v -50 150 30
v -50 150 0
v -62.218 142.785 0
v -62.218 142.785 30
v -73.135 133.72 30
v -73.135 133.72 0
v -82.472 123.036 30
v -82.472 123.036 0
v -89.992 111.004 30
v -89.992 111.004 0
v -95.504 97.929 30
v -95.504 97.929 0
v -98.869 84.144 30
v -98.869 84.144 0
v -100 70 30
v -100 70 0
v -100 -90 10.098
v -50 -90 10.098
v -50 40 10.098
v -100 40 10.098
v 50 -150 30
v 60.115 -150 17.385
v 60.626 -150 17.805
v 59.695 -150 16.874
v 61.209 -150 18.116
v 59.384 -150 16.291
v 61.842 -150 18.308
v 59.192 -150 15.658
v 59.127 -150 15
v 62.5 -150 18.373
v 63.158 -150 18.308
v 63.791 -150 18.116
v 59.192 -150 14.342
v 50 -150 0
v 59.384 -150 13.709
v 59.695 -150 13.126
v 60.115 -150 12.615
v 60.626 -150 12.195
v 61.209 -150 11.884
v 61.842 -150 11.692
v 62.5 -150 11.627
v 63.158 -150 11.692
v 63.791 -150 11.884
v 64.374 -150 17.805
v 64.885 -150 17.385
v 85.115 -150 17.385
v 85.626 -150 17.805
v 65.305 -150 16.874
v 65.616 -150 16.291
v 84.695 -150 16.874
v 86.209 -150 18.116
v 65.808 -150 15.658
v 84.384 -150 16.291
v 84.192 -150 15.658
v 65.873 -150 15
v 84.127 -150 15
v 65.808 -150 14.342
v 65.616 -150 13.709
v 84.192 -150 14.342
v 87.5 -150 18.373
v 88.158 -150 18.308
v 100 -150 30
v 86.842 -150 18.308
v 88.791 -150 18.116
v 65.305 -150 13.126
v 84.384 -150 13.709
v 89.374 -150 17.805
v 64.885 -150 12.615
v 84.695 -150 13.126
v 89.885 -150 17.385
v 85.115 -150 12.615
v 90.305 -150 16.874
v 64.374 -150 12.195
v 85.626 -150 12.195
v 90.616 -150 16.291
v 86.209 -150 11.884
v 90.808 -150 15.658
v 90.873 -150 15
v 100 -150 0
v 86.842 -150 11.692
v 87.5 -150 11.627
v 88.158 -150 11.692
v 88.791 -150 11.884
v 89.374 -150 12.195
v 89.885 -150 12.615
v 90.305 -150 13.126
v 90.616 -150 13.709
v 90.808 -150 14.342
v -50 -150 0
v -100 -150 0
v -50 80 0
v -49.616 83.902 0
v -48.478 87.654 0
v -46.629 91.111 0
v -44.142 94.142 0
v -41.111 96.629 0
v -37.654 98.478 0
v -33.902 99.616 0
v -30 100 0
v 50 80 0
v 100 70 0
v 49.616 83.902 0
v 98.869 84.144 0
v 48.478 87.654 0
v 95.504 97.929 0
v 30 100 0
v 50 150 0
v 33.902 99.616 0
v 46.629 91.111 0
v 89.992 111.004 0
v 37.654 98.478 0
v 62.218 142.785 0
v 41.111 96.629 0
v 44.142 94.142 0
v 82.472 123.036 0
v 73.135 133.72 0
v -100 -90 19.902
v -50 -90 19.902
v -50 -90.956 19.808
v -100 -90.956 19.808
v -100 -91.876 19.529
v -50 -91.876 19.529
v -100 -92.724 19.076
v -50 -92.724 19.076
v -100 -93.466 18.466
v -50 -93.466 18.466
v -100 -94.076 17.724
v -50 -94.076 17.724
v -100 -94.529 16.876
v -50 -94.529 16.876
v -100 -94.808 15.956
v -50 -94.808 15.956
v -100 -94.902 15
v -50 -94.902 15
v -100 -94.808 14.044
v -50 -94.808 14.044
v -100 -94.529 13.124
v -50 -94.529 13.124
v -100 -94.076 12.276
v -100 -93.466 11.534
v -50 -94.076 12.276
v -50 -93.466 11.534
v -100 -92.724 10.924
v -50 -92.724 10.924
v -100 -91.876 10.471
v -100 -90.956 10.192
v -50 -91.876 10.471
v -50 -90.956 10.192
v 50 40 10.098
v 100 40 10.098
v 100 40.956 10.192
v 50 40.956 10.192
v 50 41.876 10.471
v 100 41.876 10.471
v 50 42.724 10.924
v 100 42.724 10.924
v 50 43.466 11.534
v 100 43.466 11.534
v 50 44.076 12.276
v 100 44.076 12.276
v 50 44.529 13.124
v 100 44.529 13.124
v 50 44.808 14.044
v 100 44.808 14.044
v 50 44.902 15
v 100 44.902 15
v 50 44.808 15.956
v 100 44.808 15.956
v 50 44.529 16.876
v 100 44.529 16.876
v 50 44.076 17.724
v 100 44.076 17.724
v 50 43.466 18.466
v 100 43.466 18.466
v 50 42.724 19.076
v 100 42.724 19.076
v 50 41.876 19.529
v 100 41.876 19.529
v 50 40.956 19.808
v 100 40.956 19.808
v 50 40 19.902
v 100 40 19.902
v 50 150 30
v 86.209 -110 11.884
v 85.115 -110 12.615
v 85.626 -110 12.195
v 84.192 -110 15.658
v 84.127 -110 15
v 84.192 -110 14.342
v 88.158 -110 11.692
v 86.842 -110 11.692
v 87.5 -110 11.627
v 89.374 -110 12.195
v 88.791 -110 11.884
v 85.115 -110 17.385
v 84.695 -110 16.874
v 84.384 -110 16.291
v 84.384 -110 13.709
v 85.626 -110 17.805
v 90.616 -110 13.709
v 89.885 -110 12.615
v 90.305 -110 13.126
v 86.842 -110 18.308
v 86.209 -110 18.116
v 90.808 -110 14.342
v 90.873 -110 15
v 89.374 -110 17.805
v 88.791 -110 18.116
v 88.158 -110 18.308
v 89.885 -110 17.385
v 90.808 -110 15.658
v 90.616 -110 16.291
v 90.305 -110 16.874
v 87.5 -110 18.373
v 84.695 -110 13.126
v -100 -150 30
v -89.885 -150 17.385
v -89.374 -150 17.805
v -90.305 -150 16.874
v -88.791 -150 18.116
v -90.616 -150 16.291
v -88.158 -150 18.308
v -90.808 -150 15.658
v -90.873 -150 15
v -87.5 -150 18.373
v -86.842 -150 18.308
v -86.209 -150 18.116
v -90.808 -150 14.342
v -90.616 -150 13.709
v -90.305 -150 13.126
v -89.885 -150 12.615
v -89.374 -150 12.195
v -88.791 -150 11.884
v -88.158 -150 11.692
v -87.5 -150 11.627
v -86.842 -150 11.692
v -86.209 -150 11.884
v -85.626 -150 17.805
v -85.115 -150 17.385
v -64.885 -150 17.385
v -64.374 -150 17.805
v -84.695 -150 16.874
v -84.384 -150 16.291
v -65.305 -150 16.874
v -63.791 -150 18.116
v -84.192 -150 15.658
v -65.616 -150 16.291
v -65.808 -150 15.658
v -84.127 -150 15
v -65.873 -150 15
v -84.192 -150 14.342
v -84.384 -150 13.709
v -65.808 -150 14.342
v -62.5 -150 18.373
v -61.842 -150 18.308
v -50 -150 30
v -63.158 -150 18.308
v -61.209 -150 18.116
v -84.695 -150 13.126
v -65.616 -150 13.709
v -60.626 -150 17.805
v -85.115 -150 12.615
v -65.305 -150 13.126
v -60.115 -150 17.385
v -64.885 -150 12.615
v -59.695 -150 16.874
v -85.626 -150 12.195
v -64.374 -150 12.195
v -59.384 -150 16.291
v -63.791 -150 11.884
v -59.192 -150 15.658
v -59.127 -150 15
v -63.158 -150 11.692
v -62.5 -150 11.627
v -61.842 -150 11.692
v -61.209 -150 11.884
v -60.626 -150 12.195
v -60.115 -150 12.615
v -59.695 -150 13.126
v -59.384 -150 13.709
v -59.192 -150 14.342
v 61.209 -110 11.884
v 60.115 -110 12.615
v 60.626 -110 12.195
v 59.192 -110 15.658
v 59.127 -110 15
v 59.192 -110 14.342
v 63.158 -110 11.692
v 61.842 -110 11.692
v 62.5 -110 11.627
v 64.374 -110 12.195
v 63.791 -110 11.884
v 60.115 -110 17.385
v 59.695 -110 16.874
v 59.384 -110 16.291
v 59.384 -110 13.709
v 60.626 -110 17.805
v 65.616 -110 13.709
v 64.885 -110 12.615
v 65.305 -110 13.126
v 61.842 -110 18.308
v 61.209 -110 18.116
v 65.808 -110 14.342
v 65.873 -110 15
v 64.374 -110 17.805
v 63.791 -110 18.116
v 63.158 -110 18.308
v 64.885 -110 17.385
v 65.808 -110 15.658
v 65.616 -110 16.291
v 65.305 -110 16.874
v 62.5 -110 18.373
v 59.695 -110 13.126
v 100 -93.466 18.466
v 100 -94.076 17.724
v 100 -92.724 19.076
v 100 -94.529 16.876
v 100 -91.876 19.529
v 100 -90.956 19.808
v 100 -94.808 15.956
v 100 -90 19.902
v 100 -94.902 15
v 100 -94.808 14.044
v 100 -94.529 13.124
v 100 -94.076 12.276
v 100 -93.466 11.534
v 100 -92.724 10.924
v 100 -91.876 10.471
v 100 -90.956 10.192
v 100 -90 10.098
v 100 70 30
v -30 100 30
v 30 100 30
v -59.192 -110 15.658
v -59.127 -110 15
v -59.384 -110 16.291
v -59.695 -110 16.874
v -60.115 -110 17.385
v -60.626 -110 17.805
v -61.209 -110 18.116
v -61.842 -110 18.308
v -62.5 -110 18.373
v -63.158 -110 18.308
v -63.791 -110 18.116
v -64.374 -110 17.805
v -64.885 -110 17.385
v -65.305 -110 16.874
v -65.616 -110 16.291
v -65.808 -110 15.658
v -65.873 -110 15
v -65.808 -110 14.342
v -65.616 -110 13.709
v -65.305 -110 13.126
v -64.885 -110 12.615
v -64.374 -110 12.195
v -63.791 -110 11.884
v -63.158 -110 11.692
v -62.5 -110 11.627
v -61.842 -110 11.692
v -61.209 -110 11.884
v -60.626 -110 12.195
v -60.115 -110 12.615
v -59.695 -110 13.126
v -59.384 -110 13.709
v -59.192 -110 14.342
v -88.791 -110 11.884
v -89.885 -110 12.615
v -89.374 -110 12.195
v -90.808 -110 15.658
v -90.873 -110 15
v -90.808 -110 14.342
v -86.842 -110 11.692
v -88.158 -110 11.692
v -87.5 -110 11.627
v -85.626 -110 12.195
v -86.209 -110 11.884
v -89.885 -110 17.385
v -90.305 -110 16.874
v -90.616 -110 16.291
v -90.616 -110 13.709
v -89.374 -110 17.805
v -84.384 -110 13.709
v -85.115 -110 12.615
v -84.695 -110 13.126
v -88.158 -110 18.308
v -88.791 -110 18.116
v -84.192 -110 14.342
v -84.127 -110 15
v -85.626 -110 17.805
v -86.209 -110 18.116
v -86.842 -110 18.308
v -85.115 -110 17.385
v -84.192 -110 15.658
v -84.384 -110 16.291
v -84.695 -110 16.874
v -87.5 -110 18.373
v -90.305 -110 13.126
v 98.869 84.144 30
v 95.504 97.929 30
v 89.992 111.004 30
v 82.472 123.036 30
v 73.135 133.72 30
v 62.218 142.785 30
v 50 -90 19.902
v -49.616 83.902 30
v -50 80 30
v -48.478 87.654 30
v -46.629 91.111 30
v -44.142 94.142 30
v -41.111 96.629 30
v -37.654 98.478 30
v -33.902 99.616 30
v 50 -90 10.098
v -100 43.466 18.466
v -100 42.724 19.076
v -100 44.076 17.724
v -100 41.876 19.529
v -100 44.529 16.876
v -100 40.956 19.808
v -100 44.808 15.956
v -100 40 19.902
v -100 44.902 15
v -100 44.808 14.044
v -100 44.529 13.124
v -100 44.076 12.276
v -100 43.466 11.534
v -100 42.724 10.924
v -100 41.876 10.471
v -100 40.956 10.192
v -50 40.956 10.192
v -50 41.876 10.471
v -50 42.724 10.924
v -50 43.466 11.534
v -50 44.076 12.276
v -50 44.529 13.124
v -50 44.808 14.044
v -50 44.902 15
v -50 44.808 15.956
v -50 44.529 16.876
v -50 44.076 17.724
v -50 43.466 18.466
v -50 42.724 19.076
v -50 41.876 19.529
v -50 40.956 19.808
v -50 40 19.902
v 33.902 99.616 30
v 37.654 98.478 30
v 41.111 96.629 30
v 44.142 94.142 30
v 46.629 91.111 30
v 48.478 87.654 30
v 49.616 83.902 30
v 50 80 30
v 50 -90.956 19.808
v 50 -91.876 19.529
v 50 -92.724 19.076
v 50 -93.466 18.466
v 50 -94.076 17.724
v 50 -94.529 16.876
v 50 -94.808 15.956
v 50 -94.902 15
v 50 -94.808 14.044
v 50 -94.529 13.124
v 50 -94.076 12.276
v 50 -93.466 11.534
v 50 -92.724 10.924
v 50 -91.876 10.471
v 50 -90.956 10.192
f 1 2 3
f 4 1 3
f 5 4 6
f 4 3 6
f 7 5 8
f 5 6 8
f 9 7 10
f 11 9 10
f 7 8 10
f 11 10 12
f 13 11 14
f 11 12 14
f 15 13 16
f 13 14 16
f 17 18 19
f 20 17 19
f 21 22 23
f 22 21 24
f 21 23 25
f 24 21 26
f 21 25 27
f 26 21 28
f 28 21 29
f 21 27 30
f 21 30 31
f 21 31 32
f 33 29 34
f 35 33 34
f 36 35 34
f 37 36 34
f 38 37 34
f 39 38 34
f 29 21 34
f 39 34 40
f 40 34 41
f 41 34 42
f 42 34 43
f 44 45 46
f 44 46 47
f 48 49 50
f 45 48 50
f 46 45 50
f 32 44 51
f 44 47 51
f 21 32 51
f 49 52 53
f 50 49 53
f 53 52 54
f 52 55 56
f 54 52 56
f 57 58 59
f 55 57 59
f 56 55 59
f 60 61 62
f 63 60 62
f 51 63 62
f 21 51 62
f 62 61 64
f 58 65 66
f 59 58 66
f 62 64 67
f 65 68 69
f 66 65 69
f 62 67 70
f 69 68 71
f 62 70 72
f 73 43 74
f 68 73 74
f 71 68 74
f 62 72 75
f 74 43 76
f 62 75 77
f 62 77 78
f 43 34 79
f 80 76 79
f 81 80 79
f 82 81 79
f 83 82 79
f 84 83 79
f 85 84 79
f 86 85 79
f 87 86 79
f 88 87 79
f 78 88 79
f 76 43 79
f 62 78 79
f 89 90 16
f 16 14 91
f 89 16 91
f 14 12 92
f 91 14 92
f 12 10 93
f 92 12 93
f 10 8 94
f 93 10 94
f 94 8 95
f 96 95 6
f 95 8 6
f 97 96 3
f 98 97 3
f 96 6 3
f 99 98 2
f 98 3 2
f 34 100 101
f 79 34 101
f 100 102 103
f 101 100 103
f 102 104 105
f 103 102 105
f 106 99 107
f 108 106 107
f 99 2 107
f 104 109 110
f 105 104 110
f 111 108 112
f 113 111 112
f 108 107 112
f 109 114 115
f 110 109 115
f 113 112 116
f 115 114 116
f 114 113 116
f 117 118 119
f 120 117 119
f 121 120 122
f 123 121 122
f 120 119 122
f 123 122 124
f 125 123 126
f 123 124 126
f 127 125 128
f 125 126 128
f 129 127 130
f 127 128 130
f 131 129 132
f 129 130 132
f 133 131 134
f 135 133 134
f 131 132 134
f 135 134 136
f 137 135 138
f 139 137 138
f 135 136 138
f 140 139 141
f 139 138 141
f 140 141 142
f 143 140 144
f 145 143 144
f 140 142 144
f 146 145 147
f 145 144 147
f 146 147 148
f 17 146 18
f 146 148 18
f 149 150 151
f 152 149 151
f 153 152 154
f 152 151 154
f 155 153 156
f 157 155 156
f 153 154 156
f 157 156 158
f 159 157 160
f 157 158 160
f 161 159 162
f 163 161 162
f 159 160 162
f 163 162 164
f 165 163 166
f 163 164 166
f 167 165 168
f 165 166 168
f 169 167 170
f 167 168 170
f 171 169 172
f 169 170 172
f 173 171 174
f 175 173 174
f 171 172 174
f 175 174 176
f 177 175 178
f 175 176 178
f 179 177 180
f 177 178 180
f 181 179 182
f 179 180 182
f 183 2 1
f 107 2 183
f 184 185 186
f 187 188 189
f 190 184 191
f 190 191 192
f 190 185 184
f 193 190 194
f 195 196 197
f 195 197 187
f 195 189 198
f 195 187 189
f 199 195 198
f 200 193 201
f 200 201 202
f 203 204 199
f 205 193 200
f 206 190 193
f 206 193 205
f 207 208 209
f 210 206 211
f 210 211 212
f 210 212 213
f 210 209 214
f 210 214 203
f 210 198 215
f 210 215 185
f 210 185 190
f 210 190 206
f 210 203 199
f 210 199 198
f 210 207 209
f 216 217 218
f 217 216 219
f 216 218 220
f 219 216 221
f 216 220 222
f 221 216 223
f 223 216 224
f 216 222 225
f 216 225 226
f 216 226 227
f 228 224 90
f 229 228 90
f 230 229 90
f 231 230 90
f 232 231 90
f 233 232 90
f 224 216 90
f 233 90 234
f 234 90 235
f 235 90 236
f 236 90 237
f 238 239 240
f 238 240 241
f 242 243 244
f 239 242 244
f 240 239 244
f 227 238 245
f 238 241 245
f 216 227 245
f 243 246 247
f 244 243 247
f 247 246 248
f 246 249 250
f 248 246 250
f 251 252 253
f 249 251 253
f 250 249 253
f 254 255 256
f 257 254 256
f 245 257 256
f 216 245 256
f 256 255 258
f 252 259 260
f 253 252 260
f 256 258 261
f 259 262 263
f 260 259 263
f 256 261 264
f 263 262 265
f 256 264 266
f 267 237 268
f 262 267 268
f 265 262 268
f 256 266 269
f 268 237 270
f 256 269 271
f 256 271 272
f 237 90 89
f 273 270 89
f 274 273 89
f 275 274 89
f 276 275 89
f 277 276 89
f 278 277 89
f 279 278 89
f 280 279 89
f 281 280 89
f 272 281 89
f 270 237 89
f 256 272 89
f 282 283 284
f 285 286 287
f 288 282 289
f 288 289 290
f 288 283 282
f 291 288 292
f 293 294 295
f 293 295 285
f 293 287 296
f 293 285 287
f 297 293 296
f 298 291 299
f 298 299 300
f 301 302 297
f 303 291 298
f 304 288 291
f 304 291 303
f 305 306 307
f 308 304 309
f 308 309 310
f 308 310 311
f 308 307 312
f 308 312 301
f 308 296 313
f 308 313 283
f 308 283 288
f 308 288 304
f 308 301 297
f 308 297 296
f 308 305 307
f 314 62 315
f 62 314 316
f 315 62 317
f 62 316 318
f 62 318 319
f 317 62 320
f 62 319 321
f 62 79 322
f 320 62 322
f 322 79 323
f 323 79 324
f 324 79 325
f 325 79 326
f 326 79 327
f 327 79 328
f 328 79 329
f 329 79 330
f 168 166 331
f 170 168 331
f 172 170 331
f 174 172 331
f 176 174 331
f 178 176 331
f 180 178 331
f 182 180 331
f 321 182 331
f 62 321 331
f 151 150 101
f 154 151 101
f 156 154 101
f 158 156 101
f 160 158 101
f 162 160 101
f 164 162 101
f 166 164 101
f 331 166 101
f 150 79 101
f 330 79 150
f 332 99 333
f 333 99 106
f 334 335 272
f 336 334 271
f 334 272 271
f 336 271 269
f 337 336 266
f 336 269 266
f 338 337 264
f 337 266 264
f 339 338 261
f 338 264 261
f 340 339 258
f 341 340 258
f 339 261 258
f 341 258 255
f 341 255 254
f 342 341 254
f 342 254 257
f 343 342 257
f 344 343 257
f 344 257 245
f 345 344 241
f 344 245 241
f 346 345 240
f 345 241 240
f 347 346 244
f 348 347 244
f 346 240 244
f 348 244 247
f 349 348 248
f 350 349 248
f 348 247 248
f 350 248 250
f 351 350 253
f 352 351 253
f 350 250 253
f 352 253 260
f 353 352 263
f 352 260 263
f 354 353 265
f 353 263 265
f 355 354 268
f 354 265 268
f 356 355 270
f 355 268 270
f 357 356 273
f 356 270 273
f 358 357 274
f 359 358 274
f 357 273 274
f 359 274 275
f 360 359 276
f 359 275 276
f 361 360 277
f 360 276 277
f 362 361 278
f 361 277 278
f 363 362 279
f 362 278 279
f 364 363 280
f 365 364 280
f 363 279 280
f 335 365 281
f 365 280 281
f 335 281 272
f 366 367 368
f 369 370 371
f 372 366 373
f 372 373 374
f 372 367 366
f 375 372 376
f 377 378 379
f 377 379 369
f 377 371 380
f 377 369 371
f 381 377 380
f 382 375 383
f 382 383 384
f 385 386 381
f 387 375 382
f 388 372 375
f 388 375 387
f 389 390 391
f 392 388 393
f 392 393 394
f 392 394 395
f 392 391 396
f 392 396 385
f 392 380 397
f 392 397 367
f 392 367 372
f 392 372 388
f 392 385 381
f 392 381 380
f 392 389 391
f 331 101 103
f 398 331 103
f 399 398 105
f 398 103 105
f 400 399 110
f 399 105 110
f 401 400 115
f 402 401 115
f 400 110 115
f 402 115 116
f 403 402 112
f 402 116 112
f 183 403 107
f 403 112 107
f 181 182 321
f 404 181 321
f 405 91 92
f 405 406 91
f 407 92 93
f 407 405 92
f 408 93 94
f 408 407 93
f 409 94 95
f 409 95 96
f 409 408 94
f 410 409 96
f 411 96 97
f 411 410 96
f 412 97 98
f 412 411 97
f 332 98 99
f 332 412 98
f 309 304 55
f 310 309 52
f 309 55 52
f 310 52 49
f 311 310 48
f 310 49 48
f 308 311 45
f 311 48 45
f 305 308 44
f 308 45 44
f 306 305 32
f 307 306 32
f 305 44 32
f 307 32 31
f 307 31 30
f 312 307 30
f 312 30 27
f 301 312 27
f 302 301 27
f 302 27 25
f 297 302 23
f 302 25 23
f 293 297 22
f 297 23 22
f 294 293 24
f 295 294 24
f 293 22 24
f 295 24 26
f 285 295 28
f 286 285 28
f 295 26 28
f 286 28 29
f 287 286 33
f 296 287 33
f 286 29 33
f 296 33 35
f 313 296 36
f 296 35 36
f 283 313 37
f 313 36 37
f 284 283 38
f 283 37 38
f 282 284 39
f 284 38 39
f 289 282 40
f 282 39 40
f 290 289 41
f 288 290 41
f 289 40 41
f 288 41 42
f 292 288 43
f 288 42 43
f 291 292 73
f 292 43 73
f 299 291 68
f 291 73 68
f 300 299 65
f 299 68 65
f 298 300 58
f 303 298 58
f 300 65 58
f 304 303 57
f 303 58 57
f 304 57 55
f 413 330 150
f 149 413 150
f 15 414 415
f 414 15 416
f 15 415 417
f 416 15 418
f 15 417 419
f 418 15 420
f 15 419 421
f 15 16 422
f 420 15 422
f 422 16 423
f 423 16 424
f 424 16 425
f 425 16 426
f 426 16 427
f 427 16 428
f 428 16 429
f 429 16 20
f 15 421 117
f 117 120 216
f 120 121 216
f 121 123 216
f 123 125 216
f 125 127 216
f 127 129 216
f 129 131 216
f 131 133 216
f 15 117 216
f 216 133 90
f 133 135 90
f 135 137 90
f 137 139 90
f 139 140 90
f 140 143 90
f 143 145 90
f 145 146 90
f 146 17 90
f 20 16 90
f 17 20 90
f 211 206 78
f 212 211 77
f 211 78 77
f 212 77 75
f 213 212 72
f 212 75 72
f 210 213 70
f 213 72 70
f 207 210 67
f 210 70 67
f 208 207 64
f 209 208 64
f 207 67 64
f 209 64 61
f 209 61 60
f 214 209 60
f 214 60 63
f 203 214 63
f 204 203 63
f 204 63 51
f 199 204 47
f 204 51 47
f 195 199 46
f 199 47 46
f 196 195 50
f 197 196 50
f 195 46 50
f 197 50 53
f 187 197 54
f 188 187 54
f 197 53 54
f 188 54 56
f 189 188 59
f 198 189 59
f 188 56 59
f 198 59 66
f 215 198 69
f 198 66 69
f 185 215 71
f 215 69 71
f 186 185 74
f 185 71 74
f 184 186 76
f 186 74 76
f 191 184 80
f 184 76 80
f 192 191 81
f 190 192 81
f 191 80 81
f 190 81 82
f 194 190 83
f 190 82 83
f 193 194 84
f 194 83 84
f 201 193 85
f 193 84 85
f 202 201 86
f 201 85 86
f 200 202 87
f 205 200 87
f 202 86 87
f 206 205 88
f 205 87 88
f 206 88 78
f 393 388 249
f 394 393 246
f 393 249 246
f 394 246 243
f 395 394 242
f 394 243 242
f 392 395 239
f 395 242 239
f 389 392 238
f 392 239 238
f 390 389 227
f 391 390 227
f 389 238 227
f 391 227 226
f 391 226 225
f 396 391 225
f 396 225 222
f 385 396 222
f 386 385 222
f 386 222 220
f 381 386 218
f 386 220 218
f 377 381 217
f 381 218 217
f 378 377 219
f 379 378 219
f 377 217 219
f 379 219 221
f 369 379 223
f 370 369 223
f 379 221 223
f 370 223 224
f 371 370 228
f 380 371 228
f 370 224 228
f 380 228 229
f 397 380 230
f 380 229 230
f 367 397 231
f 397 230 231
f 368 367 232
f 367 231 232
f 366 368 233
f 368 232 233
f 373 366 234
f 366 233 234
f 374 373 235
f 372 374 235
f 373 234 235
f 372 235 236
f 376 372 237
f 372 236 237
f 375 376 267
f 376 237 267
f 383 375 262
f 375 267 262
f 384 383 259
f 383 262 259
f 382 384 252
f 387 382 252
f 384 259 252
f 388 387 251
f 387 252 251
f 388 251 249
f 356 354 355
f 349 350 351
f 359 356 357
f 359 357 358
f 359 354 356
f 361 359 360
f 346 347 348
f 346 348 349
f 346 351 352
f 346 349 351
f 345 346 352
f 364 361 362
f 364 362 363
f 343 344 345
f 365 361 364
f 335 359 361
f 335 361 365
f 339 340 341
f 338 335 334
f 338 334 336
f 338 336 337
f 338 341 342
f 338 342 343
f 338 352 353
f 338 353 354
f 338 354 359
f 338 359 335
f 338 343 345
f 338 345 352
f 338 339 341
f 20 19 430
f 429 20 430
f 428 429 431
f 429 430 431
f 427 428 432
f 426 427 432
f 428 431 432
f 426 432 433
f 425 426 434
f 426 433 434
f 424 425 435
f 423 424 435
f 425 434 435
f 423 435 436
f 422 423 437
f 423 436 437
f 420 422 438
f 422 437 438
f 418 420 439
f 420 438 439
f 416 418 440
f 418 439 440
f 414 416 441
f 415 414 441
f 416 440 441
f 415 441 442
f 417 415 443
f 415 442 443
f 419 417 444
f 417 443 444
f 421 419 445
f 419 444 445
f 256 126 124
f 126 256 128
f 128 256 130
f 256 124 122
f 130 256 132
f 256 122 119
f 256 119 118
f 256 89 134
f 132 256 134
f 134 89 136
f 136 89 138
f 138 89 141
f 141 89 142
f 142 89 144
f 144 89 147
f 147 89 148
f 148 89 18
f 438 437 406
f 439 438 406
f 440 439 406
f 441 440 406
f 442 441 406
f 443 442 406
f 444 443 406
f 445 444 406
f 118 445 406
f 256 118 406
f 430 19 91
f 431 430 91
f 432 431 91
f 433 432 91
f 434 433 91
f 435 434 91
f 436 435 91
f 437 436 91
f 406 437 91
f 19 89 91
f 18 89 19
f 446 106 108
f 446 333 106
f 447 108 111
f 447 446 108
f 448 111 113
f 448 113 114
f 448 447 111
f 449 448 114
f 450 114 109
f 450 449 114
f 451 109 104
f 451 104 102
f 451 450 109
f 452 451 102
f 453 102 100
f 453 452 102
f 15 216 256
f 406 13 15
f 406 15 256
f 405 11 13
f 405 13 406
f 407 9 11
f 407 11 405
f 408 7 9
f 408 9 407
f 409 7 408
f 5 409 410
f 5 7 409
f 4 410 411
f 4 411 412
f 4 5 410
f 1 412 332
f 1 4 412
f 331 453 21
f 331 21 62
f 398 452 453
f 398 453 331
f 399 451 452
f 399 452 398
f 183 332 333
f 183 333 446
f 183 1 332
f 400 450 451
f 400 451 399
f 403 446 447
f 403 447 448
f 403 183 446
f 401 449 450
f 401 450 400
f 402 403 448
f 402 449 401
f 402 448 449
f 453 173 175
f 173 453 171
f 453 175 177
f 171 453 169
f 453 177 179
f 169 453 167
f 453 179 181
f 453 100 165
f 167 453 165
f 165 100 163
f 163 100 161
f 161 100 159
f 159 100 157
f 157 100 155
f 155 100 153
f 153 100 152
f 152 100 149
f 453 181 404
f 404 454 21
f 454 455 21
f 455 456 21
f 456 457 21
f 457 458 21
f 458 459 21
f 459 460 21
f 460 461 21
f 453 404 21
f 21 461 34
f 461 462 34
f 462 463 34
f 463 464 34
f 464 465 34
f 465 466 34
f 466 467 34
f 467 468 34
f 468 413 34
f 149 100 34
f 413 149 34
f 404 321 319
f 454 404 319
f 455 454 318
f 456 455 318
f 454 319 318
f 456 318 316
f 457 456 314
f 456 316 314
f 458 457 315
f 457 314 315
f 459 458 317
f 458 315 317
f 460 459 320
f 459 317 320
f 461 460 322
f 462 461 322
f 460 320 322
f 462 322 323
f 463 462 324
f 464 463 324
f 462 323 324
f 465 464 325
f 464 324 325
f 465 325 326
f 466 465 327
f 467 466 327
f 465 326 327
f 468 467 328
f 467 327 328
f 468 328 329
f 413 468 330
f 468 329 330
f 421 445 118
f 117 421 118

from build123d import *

# Parameters (mm, degrees)
F0_W     = 100
F0_H     = 50
F1_DEPTH = 30
F2_R     = 20
F3_R     = 3.37312
F4_DEPTH = 40
F6_DEPTH = 200.001


with BuildPart() as f1:
    # F0 (on Top) → F1 (new body)
    with BuildSketch(Plane.XY):
        with BuildLine():
            Line((-50, 100), (-50, 150))
            ThreePointArc((-50, 150), (-86.471849, 117.169906), (-100, 70))
            Line((-100, 70), (-100, -150))
            Line((-100, -150), (-50, -150))
            Line((-50, -150), (-50, 100))
        make_face()
        with Locations((0, 125)):
            Rectangle(F0_W, F0_H)
        with BuildLine():
            ThreePointArc((100, 70), (86.471849, 117.169906), (50, 150))
            Line((50, 150), (50, 100))
            Line((50, 100), (50, -150))
            Line((50, -150), (100, -150))
            Line((100, -150), (100, 70))
        make_face()
    extrude(amount=F1_DEPTH)

    # F2
    f2_edges = [f1.edges().sort_by_distance(p)[0] for p in [
        (-50, 100, 15),
        (50, 100, 15),
    ]]
    fillet(f2_edges, radius=F2_R)

    # F3 (on face) → F4 (cut)
    with BuildSketch(Plane.XZ.offset(150)):
        with Locations((-87.5, 15)):
            Circle(F3_R)
        with Locations((-62.5, 15)):
            Circle(F3_R)
        with Locations((62.5, 15)):
            Circle(F3_R)
        with Locations((87.5, 15)):
            Circle(F3_R)
    extrude(amount=-F4_DEPTH, mode=Mode.SUBTRACT)

    # F5 (on face) → F6 (cut, through all)
    with BuildSketch(Plane.YZ.offset(100)):
        with BuildLine():
            Line((-90, 10.0978), (40, 10.0978))
            ThreePointArc((40, 10.0978), (44.9022, 15), (40, 19.9022))
            Line((40, 19.9022), (-90, 19.9022))
            ThreePointArc((-90, 19.9022), (-94.9022, 15), (-90, 10.0978))
        make_face()
    extrude(amount=-F6_DEPTH, mode=Mode.SUBTRACT)


solid = f1.part
